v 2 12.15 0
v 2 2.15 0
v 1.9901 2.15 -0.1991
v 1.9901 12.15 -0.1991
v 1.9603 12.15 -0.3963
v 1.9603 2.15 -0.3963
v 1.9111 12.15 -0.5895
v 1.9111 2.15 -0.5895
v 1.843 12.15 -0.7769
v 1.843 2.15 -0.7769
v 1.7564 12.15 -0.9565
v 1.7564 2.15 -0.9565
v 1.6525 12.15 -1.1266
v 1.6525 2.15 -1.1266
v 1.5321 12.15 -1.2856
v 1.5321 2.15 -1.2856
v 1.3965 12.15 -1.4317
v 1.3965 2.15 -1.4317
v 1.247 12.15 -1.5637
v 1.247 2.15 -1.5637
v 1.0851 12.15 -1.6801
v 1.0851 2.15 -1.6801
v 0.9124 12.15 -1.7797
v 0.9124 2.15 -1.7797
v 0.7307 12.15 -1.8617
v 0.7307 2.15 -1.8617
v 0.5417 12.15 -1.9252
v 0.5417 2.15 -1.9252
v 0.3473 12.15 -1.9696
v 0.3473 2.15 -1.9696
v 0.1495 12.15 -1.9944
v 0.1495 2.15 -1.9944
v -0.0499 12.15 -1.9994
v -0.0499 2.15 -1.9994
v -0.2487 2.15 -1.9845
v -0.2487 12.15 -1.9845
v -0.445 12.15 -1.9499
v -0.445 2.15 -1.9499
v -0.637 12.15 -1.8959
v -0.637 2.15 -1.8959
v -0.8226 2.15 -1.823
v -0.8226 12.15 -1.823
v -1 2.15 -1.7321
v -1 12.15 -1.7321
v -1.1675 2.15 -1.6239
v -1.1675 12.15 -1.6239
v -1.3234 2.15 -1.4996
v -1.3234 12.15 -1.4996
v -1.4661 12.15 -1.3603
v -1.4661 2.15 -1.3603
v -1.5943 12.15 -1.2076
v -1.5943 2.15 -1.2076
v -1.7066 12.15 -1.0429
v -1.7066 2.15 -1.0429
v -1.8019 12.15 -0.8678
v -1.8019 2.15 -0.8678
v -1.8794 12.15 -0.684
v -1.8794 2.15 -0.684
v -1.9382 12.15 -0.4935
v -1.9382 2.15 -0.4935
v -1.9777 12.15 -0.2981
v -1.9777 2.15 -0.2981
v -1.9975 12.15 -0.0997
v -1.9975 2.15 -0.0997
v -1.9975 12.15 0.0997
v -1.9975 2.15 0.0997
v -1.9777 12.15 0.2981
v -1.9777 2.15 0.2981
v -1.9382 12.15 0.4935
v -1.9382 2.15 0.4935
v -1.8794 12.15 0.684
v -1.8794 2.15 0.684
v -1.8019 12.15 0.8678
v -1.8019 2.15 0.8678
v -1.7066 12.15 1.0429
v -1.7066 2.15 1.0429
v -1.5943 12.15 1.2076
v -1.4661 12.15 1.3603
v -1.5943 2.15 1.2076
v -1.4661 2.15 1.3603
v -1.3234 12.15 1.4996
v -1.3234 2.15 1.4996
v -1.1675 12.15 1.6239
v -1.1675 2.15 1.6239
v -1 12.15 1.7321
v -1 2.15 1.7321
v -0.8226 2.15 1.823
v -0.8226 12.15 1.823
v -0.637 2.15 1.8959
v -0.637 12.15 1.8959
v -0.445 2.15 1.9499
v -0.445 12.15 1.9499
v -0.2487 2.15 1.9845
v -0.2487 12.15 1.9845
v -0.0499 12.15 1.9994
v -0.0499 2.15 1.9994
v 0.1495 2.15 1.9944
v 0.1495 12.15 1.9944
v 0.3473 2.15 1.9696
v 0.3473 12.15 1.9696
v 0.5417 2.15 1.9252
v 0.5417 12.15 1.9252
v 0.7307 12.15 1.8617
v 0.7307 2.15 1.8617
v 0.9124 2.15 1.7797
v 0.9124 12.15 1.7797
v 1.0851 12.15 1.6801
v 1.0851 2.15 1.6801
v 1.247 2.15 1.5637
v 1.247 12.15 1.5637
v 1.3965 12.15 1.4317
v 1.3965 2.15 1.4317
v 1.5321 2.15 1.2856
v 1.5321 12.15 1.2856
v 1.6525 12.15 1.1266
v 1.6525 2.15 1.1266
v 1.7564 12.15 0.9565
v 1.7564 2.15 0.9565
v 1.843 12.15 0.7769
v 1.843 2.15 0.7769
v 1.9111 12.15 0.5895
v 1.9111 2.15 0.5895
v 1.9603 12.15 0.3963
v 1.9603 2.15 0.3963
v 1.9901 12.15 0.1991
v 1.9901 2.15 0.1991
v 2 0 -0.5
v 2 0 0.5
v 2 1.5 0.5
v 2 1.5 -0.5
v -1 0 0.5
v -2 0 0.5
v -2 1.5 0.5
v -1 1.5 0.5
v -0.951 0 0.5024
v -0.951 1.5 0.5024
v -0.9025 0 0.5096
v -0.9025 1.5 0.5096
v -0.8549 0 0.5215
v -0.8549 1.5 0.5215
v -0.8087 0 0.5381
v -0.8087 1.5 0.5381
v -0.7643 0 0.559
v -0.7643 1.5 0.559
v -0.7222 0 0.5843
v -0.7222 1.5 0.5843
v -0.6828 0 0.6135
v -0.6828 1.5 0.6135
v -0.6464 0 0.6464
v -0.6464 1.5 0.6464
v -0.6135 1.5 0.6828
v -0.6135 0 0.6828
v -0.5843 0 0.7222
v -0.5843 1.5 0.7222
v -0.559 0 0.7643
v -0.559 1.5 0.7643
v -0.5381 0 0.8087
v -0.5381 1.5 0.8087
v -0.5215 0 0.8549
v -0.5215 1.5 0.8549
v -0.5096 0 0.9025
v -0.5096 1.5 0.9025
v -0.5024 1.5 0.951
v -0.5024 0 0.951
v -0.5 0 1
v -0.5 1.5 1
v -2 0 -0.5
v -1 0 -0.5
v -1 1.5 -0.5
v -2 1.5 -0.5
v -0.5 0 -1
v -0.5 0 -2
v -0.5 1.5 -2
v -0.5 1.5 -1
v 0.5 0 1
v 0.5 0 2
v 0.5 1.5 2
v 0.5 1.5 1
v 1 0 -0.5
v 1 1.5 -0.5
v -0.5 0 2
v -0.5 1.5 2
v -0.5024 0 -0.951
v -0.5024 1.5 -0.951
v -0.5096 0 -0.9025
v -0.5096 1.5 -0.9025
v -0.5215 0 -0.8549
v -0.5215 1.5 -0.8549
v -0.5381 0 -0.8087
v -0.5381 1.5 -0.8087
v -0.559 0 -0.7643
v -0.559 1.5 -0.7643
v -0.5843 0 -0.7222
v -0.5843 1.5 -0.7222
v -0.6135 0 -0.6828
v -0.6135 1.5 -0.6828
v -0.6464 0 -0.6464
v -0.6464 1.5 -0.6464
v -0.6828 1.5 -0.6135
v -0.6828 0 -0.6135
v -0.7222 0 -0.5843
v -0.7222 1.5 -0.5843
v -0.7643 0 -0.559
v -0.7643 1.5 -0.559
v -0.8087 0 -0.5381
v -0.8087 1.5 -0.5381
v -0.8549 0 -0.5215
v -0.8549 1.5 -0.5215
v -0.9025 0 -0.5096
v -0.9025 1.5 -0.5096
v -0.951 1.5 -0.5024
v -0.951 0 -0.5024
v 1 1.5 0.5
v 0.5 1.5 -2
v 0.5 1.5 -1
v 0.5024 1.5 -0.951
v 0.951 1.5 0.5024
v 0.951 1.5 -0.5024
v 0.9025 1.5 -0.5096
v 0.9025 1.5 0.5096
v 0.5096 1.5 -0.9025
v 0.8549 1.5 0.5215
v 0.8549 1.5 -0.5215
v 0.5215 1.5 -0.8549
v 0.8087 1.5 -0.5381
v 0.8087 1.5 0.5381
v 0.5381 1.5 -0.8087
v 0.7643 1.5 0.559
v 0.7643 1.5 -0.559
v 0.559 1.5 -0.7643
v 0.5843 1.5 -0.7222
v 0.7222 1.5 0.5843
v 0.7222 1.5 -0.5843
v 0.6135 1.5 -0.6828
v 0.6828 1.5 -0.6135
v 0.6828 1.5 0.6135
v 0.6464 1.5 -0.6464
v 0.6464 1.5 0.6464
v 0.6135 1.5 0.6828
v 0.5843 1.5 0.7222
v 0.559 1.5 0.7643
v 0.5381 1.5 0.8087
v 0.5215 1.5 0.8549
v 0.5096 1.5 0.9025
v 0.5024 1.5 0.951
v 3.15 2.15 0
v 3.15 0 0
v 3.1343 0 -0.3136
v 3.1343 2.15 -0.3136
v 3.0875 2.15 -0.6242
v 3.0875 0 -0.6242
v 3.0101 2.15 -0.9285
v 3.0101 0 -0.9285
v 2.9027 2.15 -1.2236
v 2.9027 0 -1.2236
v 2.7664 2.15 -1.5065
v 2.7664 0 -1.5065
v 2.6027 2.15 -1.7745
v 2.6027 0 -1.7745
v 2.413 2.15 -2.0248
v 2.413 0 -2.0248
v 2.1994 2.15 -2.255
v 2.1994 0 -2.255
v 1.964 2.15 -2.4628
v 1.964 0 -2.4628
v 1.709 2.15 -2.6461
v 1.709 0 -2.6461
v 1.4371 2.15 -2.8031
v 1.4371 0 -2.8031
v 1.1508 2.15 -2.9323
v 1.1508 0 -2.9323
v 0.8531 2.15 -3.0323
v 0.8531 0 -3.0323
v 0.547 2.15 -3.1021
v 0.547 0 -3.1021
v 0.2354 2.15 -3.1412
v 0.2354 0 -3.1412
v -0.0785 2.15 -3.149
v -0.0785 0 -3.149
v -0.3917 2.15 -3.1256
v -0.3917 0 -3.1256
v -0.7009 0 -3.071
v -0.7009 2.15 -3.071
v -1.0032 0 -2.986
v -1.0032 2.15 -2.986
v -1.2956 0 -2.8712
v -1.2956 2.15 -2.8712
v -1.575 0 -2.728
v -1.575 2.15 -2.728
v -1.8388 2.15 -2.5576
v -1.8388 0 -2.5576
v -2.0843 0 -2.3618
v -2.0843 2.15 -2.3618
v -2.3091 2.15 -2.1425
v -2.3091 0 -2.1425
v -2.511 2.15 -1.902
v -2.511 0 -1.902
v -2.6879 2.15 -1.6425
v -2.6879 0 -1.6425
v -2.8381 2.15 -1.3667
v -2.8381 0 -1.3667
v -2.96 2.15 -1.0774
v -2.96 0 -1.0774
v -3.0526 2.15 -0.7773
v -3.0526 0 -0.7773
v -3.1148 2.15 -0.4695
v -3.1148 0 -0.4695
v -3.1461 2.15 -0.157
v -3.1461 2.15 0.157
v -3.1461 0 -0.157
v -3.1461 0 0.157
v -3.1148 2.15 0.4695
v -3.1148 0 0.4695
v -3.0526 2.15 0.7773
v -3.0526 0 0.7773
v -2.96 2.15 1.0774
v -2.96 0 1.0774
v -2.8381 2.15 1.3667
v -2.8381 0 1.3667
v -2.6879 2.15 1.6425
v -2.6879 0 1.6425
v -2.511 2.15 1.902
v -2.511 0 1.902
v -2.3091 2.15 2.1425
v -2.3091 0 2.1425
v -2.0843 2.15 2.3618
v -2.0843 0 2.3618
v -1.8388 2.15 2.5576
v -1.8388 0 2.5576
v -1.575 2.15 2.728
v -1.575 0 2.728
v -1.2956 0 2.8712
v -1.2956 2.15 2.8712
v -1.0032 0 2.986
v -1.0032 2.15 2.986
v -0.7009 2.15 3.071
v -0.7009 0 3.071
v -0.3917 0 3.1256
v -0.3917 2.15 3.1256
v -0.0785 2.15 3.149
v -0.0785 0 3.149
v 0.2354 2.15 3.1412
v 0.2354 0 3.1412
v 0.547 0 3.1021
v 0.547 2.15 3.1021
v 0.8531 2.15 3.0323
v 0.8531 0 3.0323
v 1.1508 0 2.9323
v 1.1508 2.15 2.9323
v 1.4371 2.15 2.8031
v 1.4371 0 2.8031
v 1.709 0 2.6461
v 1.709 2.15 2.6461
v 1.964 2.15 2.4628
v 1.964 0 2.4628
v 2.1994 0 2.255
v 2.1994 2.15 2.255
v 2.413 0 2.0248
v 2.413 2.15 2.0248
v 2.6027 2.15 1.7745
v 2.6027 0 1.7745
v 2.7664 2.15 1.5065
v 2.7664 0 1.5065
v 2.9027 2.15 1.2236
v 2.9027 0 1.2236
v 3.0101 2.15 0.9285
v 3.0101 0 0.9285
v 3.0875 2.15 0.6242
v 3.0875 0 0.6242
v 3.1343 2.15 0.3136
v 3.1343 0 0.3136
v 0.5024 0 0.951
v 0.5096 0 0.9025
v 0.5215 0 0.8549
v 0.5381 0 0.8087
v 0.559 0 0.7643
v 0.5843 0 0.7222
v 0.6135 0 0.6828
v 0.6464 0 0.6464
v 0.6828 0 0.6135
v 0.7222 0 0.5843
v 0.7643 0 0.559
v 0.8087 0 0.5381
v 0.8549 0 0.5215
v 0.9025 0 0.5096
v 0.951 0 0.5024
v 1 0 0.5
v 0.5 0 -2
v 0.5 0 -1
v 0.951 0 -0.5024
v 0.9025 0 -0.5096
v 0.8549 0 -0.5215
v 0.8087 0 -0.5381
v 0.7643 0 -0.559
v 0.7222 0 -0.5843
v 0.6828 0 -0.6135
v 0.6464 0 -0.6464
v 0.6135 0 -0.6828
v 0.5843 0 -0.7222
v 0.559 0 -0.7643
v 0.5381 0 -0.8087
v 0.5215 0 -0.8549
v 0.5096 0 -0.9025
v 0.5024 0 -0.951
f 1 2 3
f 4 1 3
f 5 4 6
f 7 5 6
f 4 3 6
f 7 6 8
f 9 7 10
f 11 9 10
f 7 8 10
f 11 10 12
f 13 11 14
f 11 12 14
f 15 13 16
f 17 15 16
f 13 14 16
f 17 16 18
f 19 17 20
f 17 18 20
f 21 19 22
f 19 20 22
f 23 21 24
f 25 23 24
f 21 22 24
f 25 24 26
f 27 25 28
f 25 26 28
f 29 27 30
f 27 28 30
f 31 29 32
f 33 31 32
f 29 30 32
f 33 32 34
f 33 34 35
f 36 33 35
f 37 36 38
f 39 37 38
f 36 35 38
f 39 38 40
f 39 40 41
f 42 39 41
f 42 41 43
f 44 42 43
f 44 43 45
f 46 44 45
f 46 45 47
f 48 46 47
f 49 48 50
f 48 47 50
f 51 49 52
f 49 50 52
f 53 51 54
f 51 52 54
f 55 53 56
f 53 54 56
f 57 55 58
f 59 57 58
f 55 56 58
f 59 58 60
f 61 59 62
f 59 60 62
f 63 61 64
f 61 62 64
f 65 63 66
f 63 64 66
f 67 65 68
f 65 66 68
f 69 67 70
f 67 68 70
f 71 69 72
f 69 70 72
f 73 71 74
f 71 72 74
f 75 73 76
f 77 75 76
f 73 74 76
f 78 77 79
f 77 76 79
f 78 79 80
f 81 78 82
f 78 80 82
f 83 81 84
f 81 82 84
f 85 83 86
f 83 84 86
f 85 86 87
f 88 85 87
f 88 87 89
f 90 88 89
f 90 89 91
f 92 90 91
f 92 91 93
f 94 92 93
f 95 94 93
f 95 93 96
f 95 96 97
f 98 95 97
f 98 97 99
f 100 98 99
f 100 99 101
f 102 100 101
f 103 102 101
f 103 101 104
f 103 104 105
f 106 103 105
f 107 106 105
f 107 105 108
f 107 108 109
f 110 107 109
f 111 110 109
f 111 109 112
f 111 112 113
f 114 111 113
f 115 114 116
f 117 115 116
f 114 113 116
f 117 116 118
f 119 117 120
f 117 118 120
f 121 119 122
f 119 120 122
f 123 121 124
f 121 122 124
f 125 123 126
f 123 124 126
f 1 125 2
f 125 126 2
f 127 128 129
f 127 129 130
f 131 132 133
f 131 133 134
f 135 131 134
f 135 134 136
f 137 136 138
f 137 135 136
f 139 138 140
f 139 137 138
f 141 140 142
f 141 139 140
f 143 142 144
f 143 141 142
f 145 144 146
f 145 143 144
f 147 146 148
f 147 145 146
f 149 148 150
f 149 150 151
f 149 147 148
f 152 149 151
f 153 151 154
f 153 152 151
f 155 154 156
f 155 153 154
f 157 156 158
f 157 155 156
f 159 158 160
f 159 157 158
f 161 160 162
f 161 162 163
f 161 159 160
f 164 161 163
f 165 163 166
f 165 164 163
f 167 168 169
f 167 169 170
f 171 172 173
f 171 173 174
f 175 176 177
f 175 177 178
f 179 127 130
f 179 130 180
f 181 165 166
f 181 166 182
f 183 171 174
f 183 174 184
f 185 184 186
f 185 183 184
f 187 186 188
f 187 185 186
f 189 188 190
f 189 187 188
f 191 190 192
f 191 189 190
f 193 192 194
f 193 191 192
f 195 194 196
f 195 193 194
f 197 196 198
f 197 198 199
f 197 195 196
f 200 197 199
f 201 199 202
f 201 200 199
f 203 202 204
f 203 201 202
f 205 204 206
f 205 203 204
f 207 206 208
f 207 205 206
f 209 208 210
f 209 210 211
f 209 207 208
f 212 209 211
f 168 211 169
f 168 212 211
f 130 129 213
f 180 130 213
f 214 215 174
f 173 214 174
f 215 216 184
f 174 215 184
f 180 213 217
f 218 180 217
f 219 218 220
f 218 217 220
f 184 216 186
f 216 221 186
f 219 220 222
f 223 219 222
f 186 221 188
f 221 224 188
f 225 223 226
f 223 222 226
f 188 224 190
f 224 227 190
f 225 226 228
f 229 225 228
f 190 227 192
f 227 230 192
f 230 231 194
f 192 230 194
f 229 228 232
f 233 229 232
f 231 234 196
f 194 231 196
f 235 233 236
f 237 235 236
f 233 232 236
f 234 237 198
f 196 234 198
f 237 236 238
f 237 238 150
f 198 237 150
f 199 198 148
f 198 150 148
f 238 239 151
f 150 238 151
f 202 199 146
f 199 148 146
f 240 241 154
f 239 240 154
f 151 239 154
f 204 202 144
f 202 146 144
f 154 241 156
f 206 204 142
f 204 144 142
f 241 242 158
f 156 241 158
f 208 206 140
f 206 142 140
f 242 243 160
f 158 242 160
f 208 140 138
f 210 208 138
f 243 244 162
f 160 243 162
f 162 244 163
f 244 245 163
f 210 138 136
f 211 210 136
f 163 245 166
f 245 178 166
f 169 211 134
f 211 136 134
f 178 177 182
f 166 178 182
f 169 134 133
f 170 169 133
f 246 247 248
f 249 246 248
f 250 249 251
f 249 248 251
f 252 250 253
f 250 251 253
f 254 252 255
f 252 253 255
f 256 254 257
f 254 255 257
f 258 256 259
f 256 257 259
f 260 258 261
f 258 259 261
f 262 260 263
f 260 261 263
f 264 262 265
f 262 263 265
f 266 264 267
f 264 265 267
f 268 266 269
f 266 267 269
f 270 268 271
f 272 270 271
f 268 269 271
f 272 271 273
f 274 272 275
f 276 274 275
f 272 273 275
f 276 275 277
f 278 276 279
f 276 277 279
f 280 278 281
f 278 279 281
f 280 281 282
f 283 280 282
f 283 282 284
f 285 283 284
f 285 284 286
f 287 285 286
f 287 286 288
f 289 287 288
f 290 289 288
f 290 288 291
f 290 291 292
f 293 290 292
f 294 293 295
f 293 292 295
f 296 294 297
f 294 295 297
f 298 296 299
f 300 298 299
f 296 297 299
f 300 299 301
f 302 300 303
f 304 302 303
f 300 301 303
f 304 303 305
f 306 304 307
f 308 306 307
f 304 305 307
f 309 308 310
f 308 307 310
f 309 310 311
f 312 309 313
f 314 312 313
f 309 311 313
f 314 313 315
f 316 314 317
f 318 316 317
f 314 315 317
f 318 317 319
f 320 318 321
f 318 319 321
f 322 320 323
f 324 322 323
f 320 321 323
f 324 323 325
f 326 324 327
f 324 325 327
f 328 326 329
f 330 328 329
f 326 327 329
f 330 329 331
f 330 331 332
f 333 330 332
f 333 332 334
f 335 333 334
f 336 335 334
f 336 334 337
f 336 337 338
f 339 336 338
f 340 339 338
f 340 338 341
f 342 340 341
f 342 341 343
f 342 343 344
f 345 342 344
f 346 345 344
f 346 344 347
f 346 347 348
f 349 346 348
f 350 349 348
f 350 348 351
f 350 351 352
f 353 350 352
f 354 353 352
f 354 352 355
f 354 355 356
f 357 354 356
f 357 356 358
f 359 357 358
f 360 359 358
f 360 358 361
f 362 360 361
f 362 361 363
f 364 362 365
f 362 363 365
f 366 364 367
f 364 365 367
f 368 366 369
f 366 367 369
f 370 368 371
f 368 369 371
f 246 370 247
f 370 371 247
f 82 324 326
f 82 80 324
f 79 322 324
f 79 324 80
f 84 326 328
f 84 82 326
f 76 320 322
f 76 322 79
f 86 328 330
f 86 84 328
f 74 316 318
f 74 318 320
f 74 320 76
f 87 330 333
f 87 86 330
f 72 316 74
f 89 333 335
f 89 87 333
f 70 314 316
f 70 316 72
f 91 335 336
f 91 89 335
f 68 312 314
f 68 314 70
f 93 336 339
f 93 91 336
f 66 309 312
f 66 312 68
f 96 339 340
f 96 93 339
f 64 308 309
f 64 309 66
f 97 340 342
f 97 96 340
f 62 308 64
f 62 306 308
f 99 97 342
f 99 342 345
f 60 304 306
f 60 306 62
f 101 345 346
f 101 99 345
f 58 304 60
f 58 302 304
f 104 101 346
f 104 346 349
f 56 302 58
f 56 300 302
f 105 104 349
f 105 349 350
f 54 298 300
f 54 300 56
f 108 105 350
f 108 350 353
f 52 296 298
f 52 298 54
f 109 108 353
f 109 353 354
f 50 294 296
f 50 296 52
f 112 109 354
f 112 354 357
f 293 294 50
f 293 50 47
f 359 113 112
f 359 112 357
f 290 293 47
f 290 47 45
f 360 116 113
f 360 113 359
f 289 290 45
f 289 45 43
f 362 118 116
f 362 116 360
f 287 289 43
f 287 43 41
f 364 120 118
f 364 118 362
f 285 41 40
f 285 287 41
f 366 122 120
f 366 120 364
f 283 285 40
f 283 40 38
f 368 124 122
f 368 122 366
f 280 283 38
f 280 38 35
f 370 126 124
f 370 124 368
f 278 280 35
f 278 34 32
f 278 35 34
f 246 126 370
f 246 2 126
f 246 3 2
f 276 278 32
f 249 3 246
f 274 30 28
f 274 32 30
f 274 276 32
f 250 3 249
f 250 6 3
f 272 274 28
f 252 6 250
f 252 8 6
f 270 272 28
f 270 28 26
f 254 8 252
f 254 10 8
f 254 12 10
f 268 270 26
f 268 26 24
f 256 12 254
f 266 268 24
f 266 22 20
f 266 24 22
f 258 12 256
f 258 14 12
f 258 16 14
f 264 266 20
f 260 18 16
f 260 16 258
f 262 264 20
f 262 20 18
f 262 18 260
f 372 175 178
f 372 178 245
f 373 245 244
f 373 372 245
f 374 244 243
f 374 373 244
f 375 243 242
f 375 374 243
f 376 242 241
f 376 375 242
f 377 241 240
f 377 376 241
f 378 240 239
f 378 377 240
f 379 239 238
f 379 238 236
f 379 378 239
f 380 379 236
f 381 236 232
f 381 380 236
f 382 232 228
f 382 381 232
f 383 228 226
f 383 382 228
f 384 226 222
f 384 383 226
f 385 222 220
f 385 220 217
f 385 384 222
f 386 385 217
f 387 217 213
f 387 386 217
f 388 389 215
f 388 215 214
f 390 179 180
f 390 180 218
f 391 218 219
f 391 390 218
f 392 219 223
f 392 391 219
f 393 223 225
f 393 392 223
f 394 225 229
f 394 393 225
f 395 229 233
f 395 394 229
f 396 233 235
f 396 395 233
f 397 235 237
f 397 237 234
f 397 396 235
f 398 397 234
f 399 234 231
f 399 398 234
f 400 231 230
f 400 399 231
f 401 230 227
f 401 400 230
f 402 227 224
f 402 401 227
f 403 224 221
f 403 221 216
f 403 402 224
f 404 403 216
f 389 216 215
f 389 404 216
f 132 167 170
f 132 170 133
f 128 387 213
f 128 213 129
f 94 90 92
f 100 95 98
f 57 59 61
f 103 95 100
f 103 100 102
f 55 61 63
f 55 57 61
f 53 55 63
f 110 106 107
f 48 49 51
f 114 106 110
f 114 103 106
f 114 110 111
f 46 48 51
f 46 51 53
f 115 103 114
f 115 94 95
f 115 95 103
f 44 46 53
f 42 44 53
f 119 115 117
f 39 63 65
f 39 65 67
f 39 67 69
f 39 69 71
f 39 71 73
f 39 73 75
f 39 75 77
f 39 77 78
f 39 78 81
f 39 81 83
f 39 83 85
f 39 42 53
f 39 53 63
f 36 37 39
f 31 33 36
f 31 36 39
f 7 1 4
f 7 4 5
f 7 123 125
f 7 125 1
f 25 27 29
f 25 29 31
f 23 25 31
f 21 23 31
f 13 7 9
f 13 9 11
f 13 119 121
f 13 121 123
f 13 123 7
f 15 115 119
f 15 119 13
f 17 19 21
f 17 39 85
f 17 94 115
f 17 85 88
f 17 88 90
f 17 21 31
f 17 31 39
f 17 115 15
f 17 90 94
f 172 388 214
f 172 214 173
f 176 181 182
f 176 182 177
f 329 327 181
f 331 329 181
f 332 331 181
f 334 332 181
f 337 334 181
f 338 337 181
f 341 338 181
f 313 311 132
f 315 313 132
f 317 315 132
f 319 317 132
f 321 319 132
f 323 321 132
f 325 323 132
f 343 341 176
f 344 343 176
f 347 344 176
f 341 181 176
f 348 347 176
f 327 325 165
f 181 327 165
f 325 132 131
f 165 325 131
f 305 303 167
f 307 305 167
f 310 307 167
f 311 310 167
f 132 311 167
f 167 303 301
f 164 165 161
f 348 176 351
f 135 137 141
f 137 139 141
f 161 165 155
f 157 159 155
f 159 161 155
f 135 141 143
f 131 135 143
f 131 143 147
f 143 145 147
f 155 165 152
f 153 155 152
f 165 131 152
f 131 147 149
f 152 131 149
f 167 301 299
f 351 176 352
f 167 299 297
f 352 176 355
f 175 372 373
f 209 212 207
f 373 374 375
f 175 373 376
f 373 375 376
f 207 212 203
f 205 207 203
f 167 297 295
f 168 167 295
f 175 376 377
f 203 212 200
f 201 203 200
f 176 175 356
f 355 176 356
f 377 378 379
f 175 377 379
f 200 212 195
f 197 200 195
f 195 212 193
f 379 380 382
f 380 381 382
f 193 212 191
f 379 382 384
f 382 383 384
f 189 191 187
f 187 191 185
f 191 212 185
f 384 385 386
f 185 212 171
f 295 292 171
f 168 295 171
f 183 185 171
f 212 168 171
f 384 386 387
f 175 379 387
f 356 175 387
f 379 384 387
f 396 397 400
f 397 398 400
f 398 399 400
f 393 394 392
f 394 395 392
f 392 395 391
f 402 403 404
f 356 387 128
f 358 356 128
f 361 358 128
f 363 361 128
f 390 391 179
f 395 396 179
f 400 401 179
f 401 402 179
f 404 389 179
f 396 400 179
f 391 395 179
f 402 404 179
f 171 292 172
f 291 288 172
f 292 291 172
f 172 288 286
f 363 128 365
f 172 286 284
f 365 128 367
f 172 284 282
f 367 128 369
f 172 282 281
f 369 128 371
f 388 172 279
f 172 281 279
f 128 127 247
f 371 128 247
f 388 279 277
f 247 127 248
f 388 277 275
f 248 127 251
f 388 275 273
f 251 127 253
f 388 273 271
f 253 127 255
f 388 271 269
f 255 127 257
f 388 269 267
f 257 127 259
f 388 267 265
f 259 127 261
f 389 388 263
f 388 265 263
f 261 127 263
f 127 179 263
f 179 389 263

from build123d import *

# Parameters (mm, degrees)
SKETCH_1_R          = 3.15
EXTRUDE_1_DEPTH     = 2.15
SKETCH_2_R          = 2
EXTRUDE_2_DEPTH     = 10
CUT_EXTRUDE_1_DEPTH = 1.5


with BuildPart() as part:
    # 草图1 → 凸台-拉伸1 (new body)
    with BuildSketch(Plane(origin=(0, 0, 0), x_dir=(1, 0, 0), z_dir=(0, 1, 0))):
        Circle(SKETCH_1_R)
    extrude(amount=EXTRUDE_1_DEPTH)

    # 草图2 → 凸台-拉伸2 (add)
    with BuildSketch(Plane(origin=(0, 2.15, 0), x_dir=(1, 0, 0), z_dir=(0, 1, 0))):
        Circle(SKETCH_2_R)
    extrude(amount=EXTRUDE_2_DEPTH)

    # 草图3 → 切除-拉伸1 (cut)
    with BuildSketch(Plane.XZ):
        with BuildLine():
            Line((-0.5, 1), (-0.5, 2))
            Line((-0.5, 2), (0.5, 2))
            Line((0.5, 2), (0.5, 1))
            ThreePointArc((0.5, 1), (0.646446609, 0.646446609), (1, 0.5))
            Line((1, 0.5), (2, 0.5))
            Line((2, 0.5), (2, -0.5))
            Line((2, -0.5), (1, -0.5))
            ThreePointArc((1, -0.5), (0.646446609, -0.646446609), (0.5, -1))
            Line((0.5, -1), (0.5, -2))
            Line((0.5, -2), (-0.5, -2))
            Line((-0.5, -2), (-0.5, -1))
            ThreePointArc((-0.5, -1), (-0.646446609, -0.646446609), (-1, -0.5))
            Line((-1, -0.5), (-2, -0.5))
            Line((-2, -0.5), (-2, 0.5))
            Line((-2, 0.5), (-1, 0.5))
            ThreePointArc((-1, 0.5), (-0.646446609, 0.646446609), (-0.5, 1))
        make_face()
    extrude(amount=-CUT_EXTRUDE_1_DEPTH, mode=Mode.SUBTRACT)


solid = part.part
